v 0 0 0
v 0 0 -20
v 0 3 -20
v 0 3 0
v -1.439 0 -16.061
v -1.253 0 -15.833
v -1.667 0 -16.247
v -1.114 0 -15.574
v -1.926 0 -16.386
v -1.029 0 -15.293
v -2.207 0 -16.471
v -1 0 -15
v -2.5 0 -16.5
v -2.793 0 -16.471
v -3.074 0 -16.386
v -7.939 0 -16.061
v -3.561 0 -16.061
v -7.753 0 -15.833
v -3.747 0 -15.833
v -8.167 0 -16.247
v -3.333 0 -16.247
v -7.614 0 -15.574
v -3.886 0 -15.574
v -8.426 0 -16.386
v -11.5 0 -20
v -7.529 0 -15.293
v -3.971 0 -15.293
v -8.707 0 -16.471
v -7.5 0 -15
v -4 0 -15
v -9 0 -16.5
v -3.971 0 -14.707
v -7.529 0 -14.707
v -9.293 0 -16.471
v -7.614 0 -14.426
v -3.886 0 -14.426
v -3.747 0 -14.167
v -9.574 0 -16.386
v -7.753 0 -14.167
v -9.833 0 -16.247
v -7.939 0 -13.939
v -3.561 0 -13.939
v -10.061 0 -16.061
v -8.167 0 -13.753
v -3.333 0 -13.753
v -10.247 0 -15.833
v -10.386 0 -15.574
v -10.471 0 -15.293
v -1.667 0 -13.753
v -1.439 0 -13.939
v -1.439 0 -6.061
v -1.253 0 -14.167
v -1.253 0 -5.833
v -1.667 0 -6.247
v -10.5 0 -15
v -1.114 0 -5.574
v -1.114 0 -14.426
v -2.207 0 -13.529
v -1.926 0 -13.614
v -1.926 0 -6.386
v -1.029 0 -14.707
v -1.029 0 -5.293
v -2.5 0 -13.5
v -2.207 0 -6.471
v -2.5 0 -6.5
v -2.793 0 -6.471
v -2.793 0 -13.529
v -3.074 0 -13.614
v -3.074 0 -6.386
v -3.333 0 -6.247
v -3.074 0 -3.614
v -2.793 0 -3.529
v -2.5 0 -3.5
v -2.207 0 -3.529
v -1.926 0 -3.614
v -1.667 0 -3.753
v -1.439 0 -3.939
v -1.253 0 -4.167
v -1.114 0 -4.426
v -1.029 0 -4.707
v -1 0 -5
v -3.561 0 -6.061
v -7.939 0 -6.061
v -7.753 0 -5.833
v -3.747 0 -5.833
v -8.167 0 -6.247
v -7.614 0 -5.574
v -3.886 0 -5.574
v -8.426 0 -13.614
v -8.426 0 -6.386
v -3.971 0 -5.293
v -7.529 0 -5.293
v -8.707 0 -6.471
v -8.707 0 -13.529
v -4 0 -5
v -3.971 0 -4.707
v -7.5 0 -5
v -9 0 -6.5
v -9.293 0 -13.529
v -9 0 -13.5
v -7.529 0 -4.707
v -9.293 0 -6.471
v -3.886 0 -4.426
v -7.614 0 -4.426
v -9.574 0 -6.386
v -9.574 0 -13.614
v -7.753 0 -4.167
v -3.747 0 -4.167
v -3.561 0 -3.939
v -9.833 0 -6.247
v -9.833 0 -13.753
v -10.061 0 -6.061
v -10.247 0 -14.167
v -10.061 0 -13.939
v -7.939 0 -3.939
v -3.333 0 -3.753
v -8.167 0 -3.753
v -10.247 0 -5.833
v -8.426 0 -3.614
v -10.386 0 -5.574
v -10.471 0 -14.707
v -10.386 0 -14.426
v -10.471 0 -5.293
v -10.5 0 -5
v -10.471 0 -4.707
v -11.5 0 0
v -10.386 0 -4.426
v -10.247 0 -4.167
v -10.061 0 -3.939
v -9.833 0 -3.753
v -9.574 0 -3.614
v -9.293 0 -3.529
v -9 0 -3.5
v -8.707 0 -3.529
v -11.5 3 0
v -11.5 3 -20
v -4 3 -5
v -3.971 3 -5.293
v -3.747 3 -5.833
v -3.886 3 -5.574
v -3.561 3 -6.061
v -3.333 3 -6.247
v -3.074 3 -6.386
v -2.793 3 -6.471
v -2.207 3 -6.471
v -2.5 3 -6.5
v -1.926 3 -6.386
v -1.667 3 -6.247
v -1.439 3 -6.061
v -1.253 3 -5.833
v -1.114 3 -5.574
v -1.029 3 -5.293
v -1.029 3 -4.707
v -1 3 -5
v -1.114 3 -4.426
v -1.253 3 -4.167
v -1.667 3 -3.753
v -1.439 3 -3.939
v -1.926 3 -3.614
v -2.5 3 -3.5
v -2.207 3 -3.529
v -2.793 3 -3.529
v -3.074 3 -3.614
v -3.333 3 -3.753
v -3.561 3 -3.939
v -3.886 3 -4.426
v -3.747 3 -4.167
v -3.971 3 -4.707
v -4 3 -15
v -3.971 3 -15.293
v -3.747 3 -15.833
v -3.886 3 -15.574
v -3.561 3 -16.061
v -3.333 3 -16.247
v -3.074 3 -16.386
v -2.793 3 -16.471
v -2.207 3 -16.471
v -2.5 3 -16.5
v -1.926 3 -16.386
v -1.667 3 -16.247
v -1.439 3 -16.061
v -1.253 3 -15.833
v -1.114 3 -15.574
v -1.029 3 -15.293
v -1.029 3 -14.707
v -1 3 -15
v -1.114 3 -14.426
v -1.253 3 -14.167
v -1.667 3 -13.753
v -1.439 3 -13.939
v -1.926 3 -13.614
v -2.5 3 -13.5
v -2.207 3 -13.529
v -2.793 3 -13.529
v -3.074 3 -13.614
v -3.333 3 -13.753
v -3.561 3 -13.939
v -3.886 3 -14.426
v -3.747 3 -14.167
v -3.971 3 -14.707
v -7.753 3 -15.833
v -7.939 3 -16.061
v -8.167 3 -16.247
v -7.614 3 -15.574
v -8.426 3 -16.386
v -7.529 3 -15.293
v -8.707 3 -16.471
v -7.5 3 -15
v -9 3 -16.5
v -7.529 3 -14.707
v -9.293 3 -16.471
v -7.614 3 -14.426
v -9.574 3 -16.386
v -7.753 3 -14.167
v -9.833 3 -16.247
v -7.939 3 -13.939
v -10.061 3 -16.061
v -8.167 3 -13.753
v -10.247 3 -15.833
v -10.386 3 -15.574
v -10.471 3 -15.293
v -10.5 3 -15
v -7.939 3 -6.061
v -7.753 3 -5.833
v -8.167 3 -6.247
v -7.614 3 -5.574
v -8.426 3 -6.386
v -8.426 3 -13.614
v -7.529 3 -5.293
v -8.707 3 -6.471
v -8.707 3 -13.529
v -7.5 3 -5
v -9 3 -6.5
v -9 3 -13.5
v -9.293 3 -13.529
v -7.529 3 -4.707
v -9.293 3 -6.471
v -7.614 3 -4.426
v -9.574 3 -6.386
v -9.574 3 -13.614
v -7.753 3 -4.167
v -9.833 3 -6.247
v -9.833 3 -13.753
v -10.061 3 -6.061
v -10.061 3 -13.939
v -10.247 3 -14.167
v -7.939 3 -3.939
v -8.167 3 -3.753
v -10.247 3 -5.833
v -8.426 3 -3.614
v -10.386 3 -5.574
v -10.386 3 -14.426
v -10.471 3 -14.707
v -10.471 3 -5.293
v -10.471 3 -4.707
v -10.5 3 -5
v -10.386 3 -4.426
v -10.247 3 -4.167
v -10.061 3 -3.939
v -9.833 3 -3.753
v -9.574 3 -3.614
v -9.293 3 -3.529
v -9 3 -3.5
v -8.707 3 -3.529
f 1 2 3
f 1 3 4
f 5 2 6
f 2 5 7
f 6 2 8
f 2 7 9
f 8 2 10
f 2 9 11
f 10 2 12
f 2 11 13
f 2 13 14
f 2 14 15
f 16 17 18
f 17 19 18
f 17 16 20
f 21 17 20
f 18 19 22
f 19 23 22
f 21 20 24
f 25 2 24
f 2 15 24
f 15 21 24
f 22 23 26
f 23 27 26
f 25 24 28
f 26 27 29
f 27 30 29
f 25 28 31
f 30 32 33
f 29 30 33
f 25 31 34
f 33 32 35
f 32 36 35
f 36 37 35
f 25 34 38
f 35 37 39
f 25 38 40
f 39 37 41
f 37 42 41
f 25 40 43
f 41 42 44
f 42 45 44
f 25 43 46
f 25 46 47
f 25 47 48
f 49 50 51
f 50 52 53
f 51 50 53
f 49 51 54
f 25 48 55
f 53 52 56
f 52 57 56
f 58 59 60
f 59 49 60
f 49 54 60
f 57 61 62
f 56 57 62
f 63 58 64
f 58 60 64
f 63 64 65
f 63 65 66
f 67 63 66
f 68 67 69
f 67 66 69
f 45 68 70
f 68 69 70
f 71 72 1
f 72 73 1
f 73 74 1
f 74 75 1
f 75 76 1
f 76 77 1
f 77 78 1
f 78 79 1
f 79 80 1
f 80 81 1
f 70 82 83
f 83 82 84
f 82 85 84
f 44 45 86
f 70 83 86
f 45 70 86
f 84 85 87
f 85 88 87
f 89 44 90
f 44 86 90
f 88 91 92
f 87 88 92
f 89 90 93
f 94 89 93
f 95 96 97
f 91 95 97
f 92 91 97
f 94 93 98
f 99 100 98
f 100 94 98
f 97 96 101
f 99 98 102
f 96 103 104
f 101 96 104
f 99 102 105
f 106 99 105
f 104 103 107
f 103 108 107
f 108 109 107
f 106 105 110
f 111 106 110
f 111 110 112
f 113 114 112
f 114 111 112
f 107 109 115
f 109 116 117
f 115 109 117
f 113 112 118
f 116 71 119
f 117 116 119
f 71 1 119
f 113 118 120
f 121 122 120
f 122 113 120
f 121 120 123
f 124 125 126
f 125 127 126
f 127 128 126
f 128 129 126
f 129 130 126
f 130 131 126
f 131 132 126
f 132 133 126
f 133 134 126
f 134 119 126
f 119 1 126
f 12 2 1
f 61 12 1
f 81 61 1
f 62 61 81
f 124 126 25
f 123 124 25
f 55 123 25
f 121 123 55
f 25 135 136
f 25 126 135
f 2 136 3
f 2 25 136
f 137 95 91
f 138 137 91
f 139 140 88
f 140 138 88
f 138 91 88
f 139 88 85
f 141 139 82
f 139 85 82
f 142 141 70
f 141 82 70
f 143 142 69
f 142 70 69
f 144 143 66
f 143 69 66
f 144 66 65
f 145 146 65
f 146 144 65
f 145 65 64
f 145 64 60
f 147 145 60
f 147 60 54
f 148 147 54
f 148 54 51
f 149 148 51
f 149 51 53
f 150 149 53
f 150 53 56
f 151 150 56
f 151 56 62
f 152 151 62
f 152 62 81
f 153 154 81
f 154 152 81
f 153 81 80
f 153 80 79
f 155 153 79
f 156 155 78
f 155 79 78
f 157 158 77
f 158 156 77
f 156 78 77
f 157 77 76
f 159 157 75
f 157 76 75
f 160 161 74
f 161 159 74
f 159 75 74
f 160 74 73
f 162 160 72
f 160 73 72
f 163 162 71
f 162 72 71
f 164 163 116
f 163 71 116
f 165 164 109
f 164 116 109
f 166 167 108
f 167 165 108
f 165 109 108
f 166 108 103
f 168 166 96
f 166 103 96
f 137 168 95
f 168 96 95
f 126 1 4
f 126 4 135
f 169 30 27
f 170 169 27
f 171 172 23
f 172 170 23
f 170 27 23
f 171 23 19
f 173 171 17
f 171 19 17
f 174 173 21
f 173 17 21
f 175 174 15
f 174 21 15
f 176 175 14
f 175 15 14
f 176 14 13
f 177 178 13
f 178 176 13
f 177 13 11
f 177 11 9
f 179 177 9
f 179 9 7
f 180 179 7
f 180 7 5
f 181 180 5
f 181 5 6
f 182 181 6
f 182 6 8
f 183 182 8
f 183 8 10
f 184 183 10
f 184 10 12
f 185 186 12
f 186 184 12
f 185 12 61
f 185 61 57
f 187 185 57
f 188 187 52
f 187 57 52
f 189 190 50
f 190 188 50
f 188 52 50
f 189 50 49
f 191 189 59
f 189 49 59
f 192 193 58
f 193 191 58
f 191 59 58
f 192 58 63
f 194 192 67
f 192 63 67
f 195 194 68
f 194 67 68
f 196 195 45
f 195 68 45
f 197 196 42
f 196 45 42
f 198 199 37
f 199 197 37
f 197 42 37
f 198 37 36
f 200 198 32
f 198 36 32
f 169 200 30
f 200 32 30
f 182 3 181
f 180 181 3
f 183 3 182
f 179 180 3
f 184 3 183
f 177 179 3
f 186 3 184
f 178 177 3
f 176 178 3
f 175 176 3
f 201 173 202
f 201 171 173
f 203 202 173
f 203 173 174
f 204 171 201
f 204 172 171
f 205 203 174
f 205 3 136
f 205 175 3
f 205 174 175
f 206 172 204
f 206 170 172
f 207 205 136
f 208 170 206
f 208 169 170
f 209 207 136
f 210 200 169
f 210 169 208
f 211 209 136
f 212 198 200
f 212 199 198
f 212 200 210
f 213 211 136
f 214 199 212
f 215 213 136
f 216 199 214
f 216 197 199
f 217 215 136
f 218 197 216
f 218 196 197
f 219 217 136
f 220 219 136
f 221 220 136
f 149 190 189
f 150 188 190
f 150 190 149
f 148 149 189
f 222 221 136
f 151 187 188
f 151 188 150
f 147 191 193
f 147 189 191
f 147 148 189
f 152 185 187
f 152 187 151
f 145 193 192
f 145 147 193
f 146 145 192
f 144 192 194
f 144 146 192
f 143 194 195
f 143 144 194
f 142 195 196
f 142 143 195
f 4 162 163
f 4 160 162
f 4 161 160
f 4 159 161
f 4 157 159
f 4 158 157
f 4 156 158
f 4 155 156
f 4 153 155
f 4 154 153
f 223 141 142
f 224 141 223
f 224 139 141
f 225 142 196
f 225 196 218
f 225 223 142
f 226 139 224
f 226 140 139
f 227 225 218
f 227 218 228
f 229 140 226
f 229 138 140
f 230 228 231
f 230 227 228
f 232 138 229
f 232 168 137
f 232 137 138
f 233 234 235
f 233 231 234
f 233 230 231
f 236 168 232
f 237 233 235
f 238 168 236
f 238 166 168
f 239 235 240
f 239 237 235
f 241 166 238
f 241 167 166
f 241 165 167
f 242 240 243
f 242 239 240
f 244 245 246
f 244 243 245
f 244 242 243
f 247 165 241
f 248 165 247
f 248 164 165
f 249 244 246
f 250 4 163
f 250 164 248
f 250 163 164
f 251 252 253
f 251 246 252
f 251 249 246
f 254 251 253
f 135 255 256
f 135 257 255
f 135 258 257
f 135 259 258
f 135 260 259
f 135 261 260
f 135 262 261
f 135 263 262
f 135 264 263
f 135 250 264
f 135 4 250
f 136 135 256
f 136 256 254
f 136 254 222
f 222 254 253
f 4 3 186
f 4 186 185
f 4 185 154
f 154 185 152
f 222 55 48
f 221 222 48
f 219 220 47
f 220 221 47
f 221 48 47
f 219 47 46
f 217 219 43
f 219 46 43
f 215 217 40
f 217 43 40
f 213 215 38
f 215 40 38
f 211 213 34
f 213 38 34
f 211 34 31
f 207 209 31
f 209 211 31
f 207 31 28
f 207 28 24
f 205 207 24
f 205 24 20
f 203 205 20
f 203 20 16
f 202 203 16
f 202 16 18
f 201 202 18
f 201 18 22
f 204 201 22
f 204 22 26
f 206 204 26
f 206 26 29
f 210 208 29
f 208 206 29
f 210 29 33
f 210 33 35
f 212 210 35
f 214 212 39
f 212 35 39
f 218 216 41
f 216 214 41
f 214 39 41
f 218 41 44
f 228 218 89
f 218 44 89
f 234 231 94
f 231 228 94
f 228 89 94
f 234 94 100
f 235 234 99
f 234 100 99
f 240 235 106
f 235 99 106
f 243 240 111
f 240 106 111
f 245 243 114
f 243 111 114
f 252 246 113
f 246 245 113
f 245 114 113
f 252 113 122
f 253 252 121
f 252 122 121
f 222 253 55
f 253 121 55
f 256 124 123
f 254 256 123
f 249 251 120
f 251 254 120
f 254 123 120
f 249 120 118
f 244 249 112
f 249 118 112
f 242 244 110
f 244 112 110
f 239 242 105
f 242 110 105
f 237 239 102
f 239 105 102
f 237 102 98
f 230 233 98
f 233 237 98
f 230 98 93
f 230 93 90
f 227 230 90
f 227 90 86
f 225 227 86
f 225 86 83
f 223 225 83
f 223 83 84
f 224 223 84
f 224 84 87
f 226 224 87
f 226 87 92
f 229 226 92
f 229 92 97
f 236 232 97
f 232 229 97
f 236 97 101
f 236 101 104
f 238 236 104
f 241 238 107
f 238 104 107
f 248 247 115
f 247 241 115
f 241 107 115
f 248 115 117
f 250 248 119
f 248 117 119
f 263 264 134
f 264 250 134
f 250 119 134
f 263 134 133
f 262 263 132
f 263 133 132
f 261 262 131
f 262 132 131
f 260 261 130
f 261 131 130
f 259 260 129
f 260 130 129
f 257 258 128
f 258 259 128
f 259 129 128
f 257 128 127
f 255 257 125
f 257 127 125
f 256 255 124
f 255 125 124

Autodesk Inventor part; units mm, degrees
ref_plane "YZ Plane" through (0, 0, 0) normal (1, 0, 0) x (0, 1, 0)
ref_plane "XZ Plane" through (0, 0, 0) normal (0, 1, 0) x (-1, 0, 0)
ref_plane "XY Plane" through (0, 0, 0) normal (0, 0, 1) x (1, 0, 0)
sketch "Esquisse1" plane through (0, 0, 0) normal (0, 1, 0) x (-1, 0, 0)
  line L0 (0, 0) -> (11.5, 0)
  line L1 (11.5, 0) -> (11.5, -20)
  line L2 (11.5, -20) -> (0, -20)
  line L3 (0, -20) -> (0, 0)
  line L4 (9, 0) -> (9, -20) construction
  line L5 (5.75, 0) -> (5.75, -20) construction
  line L6 (11.5, -10) -> (0, -10) construction
  circle A0 centre (9, -15) radius 1.5
  circle A1 centre (9, -5) radius 1.5
  circle A2 centre (2.5, -15) radius 1.5
  circle A3 centre (2.5, -5) radius 1.5
  dimension "d0" = 20
  dimension "d1" = 11.5
  dimension "d2" = 3
  dimension "d3" = 2.5
  dimension "d4" = 10
extrude "Extrusion1" add sketch "Esquisse1" along normal blind 3
sketch "Esquisse2" plane through (0, 0, 0) normal (0, -1, 0) x (1, 0, 0)
  circle A0 centre (-2.5, -5) radius 1.5 projected
  circle A1 centre (-2.5, -15) radius 1.5 projected
  circle A2 centre (-9, -5) radius 1.5 projected
  circle A3 centre (-9, -15) radius 1.5 projected
  line L0 (0, 0) -> (-11.5, 0) projected
  line L1 (-11.5, 0) -> (-11.5, -20) projected
  line L2 (-11.5, -20) -> (0, -20) projected
  line L3 (0, -20) -> (0, 0) projected
  line L4 (-11.5, 0) -> (-12, 0)
  line L5 (-12, 0) -> (-12, -20)
  line L6 (-12, -20) -> (-11.5, -20)
  line L7 (-11.5, -20) -> (-11.5, 0)
  dimension "d7" = 0.5
extrude "Extrusion2" [suppressed]
properties part number "adapter_bottom"
